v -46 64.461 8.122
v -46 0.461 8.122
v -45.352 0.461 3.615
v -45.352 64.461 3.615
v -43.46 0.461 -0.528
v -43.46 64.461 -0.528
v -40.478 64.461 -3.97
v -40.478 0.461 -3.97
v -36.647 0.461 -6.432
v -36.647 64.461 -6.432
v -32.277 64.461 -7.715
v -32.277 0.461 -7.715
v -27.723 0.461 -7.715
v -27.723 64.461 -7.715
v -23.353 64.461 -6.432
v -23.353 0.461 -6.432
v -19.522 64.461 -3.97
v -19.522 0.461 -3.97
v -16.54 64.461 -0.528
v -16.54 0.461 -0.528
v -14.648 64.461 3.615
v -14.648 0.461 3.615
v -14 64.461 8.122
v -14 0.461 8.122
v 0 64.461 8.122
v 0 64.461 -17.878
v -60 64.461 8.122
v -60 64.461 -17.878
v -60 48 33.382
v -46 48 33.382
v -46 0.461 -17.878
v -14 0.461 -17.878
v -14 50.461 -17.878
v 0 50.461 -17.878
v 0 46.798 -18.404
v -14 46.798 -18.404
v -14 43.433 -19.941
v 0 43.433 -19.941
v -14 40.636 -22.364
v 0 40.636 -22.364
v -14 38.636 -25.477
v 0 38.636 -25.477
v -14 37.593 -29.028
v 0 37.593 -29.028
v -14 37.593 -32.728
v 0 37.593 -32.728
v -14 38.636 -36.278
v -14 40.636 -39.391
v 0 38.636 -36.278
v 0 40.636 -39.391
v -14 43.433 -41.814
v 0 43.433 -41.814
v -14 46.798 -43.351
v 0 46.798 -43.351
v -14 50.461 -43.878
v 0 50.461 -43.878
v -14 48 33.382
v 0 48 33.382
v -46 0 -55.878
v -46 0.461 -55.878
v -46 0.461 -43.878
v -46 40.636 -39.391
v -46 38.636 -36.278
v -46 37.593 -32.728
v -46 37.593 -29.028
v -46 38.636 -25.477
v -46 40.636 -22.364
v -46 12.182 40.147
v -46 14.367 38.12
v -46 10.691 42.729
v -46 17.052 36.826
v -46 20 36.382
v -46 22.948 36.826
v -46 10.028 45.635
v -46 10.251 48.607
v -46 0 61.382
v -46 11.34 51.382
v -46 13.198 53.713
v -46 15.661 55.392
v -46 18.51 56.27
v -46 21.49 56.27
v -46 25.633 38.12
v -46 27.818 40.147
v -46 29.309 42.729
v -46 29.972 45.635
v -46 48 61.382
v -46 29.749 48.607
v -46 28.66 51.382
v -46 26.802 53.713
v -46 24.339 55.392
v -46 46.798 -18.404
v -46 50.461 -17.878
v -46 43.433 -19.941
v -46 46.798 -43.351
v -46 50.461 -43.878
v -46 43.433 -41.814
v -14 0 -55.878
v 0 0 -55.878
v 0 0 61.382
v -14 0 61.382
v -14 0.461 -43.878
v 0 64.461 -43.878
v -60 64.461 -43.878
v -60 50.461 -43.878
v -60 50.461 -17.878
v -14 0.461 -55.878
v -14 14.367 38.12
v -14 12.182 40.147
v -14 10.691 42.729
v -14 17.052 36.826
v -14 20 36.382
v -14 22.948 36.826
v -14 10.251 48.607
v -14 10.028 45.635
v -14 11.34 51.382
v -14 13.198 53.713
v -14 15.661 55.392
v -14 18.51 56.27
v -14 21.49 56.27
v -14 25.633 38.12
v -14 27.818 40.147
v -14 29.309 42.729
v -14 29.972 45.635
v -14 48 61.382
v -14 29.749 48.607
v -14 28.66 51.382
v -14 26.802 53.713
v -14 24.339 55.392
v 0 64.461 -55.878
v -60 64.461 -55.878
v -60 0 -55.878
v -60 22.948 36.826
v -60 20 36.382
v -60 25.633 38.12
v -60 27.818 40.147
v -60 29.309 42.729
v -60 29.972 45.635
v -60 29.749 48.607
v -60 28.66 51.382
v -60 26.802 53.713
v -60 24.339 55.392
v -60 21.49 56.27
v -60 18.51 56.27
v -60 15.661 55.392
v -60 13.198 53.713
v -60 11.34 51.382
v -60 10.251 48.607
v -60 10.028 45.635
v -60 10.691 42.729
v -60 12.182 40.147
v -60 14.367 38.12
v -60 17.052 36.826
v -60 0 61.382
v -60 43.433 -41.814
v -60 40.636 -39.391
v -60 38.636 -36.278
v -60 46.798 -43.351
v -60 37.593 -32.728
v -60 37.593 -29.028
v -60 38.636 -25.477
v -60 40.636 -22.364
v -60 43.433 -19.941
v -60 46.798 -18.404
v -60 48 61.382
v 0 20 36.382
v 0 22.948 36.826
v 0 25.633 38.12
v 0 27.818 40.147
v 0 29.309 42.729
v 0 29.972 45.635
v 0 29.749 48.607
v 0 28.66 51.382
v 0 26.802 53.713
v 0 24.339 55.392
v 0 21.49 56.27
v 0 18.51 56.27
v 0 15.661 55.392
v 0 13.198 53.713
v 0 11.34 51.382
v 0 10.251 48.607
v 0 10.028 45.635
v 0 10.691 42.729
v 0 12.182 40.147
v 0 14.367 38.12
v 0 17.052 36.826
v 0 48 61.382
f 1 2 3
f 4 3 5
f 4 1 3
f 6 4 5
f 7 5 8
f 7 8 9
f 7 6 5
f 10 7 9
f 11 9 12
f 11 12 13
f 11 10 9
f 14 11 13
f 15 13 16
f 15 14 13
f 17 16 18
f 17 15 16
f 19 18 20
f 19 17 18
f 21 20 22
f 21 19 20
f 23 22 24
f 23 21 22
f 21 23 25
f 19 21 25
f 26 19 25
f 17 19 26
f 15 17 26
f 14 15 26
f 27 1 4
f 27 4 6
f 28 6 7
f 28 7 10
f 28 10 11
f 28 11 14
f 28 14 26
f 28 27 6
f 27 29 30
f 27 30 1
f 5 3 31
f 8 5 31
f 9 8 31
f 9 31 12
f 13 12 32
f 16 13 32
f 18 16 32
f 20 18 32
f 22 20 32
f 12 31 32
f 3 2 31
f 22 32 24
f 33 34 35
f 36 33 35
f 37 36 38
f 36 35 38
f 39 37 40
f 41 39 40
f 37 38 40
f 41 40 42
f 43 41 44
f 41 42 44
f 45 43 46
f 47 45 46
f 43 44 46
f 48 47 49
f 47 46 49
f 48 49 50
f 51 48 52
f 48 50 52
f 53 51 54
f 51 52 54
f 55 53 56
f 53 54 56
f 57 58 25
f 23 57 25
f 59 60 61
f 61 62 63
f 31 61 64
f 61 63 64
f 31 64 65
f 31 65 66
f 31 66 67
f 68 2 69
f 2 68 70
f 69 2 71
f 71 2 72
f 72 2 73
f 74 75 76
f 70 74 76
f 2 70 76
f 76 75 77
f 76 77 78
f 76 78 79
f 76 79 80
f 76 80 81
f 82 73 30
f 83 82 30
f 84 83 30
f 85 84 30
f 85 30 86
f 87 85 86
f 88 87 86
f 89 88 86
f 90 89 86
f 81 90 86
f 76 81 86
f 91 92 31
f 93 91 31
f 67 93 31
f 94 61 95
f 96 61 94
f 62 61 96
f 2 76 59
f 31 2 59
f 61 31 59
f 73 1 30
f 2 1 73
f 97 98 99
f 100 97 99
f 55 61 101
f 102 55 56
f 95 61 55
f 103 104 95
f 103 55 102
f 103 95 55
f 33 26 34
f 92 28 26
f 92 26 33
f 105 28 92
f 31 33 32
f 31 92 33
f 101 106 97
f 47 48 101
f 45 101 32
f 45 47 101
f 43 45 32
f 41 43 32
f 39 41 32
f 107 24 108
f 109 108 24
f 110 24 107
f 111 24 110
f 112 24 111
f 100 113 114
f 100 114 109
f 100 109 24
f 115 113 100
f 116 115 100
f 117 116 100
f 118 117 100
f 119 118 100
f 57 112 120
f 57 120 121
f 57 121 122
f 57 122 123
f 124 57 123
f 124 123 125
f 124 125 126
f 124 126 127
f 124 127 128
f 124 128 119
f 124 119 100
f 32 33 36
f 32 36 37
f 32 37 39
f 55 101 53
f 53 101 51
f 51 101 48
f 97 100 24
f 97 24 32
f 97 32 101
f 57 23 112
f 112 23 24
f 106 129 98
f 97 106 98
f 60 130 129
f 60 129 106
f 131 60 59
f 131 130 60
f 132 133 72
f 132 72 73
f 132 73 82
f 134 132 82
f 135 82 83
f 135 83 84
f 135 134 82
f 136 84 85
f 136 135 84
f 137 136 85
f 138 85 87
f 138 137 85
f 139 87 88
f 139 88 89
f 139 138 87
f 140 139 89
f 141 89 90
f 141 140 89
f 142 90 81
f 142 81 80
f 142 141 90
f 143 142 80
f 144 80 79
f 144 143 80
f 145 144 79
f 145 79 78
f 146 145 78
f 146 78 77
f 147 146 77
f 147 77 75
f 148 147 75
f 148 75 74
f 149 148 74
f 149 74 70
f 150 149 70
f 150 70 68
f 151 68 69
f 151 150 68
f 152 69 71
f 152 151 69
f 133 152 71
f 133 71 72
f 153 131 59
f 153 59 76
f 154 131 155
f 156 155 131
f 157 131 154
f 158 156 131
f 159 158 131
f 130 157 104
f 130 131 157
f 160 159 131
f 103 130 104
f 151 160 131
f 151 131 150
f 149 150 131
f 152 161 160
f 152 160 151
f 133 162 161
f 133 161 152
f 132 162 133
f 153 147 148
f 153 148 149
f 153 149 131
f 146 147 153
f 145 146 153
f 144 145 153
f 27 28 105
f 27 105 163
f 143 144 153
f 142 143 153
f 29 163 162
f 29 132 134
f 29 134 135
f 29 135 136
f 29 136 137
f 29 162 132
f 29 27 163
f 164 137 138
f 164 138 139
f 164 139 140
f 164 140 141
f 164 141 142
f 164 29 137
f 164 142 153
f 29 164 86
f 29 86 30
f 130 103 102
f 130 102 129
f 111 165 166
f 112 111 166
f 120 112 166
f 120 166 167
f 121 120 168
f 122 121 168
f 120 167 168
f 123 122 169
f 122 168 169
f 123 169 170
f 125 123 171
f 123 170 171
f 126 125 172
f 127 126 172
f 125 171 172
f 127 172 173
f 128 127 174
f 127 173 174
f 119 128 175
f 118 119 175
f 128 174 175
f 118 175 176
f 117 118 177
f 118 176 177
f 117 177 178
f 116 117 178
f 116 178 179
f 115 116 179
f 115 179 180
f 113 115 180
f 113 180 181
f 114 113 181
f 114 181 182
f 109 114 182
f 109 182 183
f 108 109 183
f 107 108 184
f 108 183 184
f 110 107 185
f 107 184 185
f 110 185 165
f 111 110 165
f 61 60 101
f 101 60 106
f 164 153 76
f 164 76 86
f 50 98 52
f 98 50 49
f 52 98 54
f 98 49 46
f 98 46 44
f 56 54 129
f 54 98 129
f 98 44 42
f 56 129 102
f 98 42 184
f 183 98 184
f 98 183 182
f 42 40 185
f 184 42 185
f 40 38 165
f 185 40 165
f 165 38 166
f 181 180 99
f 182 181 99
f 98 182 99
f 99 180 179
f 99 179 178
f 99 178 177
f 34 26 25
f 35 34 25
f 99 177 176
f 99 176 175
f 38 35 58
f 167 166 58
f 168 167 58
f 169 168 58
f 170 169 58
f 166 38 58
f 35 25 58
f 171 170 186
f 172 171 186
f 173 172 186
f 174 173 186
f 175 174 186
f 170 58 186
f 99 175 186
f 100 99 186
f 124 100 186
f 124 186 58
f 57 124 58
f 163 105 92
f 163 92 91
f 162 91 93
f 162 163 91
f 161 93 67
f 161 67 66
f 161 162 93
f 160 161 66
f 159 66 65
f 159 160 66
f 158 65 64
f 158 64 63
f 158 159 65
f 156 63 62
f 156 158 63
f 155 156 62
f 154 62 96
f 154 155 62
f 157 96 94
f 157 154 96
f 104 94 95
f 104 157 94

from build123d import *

# Parameters (mm, degrees)
SKETCH1_R           = 10
BOSS_EXTRUDE1_DEPTH = 14
BOSS_EXTRUDE2_DEPTH = 64
SKETCH4_W           = 60
SKETCH4_H           = 12
BOSS_EXTRUDE4_DEPTH = 64


with BuildPart() as part:
    # Sketch1 → Boss-Extrude1 (new body)
    with BuildSketch(Plane(origin=(0, 0, 0), x_dir=(0, 0, -1), z_dir=(1, 0, 0))):
        with BuildLine():
            ThreePointArc((17.877672838, 50.460908485), (30.877672838, 37.460908485), (43.877672838, 50.460908485))
            Line((43.877672838, 50.460908485), (43.877672838, 64.460908485))
            Line((43.877672838, 64.460908485), (55.877672838, 64.460908485))
            Line((55.877672838, 64.460908485), (55.877672838, 0))
            Line((55.877672838, 0), (-61.381998564, 0))
            Line((-61.381998564, 0), (-61.381998564, 48))
            Line((-61.381998564, 48), (-33.381998564, 48))
            Line((-33.381998564, 48), (-8.122327162, 64.460908485))
            Line((-8.122327162, 64.460908485), (17.877672838, 64.460908485))
            Line((17.877672838, 64.460908485), (17.877672838, 50.460908485))
        make_face()
        with Locations((-46.381998564, 20)):
            Circle(SKETCH1_R, mode=Mode.SUBTRACT)
    extrude(amount=-BOSS_EXTRUDE1_DEPTH)


with BuildPart() as body_2:
    # Mirror4: mirrored copy
    add(part.part.mirror(Plane.ZY.offset(30)))


with BuildPart() as part_1:
    add(part.part)

    add(body_2.part)  # Boss-Extrude2 merges body 2
    # Sketch2 → Boss-Extrude2 (add)
    with BuildSketch(Plane(origin=(0, 64.460908485, 0), x_dir=(1, 0, 0), z_dir=(0, 1, 0))):
        with BuildLine():
            Line((-14, 17.877672838), (-46, 17.877672838))
            Line((-46, 17.877672838), (-60, 17.877672838))
            Line((-60, 17.877672838), (-60, -8.122327162))
            Line((-60, -8.122327162), (-46, -8.122327162))
            ThreePointArc((-46, -8.122327162), (-30, 7.877672838), (-14, -8.122327162))
            Line((-14, -8.122327162), (0, -8.122327162))
            Line((0, -8.122327162), (0, 17.877672838))
            Line((0, 17.877672838), (-14, 17.877672838))
        make_face()
    extrude(amount=-BOSS_EXTRUDE2_DEPTH)

    # Sketch4 → Boss-Extrude4 (add)
    with BuildSketch(Plane(origin=(0, 64.460908485, 0), x_dir=(1, 0, 0), z_dir=(0, 1, 0))):
        with Locations((-30, 49.877672838)):
            Rectangle(SKETCH4_W, SKETCH4_H)
    extrude(amount=-BOSS_EXTRUDE4_DEPTH)


solid = part_1.part
